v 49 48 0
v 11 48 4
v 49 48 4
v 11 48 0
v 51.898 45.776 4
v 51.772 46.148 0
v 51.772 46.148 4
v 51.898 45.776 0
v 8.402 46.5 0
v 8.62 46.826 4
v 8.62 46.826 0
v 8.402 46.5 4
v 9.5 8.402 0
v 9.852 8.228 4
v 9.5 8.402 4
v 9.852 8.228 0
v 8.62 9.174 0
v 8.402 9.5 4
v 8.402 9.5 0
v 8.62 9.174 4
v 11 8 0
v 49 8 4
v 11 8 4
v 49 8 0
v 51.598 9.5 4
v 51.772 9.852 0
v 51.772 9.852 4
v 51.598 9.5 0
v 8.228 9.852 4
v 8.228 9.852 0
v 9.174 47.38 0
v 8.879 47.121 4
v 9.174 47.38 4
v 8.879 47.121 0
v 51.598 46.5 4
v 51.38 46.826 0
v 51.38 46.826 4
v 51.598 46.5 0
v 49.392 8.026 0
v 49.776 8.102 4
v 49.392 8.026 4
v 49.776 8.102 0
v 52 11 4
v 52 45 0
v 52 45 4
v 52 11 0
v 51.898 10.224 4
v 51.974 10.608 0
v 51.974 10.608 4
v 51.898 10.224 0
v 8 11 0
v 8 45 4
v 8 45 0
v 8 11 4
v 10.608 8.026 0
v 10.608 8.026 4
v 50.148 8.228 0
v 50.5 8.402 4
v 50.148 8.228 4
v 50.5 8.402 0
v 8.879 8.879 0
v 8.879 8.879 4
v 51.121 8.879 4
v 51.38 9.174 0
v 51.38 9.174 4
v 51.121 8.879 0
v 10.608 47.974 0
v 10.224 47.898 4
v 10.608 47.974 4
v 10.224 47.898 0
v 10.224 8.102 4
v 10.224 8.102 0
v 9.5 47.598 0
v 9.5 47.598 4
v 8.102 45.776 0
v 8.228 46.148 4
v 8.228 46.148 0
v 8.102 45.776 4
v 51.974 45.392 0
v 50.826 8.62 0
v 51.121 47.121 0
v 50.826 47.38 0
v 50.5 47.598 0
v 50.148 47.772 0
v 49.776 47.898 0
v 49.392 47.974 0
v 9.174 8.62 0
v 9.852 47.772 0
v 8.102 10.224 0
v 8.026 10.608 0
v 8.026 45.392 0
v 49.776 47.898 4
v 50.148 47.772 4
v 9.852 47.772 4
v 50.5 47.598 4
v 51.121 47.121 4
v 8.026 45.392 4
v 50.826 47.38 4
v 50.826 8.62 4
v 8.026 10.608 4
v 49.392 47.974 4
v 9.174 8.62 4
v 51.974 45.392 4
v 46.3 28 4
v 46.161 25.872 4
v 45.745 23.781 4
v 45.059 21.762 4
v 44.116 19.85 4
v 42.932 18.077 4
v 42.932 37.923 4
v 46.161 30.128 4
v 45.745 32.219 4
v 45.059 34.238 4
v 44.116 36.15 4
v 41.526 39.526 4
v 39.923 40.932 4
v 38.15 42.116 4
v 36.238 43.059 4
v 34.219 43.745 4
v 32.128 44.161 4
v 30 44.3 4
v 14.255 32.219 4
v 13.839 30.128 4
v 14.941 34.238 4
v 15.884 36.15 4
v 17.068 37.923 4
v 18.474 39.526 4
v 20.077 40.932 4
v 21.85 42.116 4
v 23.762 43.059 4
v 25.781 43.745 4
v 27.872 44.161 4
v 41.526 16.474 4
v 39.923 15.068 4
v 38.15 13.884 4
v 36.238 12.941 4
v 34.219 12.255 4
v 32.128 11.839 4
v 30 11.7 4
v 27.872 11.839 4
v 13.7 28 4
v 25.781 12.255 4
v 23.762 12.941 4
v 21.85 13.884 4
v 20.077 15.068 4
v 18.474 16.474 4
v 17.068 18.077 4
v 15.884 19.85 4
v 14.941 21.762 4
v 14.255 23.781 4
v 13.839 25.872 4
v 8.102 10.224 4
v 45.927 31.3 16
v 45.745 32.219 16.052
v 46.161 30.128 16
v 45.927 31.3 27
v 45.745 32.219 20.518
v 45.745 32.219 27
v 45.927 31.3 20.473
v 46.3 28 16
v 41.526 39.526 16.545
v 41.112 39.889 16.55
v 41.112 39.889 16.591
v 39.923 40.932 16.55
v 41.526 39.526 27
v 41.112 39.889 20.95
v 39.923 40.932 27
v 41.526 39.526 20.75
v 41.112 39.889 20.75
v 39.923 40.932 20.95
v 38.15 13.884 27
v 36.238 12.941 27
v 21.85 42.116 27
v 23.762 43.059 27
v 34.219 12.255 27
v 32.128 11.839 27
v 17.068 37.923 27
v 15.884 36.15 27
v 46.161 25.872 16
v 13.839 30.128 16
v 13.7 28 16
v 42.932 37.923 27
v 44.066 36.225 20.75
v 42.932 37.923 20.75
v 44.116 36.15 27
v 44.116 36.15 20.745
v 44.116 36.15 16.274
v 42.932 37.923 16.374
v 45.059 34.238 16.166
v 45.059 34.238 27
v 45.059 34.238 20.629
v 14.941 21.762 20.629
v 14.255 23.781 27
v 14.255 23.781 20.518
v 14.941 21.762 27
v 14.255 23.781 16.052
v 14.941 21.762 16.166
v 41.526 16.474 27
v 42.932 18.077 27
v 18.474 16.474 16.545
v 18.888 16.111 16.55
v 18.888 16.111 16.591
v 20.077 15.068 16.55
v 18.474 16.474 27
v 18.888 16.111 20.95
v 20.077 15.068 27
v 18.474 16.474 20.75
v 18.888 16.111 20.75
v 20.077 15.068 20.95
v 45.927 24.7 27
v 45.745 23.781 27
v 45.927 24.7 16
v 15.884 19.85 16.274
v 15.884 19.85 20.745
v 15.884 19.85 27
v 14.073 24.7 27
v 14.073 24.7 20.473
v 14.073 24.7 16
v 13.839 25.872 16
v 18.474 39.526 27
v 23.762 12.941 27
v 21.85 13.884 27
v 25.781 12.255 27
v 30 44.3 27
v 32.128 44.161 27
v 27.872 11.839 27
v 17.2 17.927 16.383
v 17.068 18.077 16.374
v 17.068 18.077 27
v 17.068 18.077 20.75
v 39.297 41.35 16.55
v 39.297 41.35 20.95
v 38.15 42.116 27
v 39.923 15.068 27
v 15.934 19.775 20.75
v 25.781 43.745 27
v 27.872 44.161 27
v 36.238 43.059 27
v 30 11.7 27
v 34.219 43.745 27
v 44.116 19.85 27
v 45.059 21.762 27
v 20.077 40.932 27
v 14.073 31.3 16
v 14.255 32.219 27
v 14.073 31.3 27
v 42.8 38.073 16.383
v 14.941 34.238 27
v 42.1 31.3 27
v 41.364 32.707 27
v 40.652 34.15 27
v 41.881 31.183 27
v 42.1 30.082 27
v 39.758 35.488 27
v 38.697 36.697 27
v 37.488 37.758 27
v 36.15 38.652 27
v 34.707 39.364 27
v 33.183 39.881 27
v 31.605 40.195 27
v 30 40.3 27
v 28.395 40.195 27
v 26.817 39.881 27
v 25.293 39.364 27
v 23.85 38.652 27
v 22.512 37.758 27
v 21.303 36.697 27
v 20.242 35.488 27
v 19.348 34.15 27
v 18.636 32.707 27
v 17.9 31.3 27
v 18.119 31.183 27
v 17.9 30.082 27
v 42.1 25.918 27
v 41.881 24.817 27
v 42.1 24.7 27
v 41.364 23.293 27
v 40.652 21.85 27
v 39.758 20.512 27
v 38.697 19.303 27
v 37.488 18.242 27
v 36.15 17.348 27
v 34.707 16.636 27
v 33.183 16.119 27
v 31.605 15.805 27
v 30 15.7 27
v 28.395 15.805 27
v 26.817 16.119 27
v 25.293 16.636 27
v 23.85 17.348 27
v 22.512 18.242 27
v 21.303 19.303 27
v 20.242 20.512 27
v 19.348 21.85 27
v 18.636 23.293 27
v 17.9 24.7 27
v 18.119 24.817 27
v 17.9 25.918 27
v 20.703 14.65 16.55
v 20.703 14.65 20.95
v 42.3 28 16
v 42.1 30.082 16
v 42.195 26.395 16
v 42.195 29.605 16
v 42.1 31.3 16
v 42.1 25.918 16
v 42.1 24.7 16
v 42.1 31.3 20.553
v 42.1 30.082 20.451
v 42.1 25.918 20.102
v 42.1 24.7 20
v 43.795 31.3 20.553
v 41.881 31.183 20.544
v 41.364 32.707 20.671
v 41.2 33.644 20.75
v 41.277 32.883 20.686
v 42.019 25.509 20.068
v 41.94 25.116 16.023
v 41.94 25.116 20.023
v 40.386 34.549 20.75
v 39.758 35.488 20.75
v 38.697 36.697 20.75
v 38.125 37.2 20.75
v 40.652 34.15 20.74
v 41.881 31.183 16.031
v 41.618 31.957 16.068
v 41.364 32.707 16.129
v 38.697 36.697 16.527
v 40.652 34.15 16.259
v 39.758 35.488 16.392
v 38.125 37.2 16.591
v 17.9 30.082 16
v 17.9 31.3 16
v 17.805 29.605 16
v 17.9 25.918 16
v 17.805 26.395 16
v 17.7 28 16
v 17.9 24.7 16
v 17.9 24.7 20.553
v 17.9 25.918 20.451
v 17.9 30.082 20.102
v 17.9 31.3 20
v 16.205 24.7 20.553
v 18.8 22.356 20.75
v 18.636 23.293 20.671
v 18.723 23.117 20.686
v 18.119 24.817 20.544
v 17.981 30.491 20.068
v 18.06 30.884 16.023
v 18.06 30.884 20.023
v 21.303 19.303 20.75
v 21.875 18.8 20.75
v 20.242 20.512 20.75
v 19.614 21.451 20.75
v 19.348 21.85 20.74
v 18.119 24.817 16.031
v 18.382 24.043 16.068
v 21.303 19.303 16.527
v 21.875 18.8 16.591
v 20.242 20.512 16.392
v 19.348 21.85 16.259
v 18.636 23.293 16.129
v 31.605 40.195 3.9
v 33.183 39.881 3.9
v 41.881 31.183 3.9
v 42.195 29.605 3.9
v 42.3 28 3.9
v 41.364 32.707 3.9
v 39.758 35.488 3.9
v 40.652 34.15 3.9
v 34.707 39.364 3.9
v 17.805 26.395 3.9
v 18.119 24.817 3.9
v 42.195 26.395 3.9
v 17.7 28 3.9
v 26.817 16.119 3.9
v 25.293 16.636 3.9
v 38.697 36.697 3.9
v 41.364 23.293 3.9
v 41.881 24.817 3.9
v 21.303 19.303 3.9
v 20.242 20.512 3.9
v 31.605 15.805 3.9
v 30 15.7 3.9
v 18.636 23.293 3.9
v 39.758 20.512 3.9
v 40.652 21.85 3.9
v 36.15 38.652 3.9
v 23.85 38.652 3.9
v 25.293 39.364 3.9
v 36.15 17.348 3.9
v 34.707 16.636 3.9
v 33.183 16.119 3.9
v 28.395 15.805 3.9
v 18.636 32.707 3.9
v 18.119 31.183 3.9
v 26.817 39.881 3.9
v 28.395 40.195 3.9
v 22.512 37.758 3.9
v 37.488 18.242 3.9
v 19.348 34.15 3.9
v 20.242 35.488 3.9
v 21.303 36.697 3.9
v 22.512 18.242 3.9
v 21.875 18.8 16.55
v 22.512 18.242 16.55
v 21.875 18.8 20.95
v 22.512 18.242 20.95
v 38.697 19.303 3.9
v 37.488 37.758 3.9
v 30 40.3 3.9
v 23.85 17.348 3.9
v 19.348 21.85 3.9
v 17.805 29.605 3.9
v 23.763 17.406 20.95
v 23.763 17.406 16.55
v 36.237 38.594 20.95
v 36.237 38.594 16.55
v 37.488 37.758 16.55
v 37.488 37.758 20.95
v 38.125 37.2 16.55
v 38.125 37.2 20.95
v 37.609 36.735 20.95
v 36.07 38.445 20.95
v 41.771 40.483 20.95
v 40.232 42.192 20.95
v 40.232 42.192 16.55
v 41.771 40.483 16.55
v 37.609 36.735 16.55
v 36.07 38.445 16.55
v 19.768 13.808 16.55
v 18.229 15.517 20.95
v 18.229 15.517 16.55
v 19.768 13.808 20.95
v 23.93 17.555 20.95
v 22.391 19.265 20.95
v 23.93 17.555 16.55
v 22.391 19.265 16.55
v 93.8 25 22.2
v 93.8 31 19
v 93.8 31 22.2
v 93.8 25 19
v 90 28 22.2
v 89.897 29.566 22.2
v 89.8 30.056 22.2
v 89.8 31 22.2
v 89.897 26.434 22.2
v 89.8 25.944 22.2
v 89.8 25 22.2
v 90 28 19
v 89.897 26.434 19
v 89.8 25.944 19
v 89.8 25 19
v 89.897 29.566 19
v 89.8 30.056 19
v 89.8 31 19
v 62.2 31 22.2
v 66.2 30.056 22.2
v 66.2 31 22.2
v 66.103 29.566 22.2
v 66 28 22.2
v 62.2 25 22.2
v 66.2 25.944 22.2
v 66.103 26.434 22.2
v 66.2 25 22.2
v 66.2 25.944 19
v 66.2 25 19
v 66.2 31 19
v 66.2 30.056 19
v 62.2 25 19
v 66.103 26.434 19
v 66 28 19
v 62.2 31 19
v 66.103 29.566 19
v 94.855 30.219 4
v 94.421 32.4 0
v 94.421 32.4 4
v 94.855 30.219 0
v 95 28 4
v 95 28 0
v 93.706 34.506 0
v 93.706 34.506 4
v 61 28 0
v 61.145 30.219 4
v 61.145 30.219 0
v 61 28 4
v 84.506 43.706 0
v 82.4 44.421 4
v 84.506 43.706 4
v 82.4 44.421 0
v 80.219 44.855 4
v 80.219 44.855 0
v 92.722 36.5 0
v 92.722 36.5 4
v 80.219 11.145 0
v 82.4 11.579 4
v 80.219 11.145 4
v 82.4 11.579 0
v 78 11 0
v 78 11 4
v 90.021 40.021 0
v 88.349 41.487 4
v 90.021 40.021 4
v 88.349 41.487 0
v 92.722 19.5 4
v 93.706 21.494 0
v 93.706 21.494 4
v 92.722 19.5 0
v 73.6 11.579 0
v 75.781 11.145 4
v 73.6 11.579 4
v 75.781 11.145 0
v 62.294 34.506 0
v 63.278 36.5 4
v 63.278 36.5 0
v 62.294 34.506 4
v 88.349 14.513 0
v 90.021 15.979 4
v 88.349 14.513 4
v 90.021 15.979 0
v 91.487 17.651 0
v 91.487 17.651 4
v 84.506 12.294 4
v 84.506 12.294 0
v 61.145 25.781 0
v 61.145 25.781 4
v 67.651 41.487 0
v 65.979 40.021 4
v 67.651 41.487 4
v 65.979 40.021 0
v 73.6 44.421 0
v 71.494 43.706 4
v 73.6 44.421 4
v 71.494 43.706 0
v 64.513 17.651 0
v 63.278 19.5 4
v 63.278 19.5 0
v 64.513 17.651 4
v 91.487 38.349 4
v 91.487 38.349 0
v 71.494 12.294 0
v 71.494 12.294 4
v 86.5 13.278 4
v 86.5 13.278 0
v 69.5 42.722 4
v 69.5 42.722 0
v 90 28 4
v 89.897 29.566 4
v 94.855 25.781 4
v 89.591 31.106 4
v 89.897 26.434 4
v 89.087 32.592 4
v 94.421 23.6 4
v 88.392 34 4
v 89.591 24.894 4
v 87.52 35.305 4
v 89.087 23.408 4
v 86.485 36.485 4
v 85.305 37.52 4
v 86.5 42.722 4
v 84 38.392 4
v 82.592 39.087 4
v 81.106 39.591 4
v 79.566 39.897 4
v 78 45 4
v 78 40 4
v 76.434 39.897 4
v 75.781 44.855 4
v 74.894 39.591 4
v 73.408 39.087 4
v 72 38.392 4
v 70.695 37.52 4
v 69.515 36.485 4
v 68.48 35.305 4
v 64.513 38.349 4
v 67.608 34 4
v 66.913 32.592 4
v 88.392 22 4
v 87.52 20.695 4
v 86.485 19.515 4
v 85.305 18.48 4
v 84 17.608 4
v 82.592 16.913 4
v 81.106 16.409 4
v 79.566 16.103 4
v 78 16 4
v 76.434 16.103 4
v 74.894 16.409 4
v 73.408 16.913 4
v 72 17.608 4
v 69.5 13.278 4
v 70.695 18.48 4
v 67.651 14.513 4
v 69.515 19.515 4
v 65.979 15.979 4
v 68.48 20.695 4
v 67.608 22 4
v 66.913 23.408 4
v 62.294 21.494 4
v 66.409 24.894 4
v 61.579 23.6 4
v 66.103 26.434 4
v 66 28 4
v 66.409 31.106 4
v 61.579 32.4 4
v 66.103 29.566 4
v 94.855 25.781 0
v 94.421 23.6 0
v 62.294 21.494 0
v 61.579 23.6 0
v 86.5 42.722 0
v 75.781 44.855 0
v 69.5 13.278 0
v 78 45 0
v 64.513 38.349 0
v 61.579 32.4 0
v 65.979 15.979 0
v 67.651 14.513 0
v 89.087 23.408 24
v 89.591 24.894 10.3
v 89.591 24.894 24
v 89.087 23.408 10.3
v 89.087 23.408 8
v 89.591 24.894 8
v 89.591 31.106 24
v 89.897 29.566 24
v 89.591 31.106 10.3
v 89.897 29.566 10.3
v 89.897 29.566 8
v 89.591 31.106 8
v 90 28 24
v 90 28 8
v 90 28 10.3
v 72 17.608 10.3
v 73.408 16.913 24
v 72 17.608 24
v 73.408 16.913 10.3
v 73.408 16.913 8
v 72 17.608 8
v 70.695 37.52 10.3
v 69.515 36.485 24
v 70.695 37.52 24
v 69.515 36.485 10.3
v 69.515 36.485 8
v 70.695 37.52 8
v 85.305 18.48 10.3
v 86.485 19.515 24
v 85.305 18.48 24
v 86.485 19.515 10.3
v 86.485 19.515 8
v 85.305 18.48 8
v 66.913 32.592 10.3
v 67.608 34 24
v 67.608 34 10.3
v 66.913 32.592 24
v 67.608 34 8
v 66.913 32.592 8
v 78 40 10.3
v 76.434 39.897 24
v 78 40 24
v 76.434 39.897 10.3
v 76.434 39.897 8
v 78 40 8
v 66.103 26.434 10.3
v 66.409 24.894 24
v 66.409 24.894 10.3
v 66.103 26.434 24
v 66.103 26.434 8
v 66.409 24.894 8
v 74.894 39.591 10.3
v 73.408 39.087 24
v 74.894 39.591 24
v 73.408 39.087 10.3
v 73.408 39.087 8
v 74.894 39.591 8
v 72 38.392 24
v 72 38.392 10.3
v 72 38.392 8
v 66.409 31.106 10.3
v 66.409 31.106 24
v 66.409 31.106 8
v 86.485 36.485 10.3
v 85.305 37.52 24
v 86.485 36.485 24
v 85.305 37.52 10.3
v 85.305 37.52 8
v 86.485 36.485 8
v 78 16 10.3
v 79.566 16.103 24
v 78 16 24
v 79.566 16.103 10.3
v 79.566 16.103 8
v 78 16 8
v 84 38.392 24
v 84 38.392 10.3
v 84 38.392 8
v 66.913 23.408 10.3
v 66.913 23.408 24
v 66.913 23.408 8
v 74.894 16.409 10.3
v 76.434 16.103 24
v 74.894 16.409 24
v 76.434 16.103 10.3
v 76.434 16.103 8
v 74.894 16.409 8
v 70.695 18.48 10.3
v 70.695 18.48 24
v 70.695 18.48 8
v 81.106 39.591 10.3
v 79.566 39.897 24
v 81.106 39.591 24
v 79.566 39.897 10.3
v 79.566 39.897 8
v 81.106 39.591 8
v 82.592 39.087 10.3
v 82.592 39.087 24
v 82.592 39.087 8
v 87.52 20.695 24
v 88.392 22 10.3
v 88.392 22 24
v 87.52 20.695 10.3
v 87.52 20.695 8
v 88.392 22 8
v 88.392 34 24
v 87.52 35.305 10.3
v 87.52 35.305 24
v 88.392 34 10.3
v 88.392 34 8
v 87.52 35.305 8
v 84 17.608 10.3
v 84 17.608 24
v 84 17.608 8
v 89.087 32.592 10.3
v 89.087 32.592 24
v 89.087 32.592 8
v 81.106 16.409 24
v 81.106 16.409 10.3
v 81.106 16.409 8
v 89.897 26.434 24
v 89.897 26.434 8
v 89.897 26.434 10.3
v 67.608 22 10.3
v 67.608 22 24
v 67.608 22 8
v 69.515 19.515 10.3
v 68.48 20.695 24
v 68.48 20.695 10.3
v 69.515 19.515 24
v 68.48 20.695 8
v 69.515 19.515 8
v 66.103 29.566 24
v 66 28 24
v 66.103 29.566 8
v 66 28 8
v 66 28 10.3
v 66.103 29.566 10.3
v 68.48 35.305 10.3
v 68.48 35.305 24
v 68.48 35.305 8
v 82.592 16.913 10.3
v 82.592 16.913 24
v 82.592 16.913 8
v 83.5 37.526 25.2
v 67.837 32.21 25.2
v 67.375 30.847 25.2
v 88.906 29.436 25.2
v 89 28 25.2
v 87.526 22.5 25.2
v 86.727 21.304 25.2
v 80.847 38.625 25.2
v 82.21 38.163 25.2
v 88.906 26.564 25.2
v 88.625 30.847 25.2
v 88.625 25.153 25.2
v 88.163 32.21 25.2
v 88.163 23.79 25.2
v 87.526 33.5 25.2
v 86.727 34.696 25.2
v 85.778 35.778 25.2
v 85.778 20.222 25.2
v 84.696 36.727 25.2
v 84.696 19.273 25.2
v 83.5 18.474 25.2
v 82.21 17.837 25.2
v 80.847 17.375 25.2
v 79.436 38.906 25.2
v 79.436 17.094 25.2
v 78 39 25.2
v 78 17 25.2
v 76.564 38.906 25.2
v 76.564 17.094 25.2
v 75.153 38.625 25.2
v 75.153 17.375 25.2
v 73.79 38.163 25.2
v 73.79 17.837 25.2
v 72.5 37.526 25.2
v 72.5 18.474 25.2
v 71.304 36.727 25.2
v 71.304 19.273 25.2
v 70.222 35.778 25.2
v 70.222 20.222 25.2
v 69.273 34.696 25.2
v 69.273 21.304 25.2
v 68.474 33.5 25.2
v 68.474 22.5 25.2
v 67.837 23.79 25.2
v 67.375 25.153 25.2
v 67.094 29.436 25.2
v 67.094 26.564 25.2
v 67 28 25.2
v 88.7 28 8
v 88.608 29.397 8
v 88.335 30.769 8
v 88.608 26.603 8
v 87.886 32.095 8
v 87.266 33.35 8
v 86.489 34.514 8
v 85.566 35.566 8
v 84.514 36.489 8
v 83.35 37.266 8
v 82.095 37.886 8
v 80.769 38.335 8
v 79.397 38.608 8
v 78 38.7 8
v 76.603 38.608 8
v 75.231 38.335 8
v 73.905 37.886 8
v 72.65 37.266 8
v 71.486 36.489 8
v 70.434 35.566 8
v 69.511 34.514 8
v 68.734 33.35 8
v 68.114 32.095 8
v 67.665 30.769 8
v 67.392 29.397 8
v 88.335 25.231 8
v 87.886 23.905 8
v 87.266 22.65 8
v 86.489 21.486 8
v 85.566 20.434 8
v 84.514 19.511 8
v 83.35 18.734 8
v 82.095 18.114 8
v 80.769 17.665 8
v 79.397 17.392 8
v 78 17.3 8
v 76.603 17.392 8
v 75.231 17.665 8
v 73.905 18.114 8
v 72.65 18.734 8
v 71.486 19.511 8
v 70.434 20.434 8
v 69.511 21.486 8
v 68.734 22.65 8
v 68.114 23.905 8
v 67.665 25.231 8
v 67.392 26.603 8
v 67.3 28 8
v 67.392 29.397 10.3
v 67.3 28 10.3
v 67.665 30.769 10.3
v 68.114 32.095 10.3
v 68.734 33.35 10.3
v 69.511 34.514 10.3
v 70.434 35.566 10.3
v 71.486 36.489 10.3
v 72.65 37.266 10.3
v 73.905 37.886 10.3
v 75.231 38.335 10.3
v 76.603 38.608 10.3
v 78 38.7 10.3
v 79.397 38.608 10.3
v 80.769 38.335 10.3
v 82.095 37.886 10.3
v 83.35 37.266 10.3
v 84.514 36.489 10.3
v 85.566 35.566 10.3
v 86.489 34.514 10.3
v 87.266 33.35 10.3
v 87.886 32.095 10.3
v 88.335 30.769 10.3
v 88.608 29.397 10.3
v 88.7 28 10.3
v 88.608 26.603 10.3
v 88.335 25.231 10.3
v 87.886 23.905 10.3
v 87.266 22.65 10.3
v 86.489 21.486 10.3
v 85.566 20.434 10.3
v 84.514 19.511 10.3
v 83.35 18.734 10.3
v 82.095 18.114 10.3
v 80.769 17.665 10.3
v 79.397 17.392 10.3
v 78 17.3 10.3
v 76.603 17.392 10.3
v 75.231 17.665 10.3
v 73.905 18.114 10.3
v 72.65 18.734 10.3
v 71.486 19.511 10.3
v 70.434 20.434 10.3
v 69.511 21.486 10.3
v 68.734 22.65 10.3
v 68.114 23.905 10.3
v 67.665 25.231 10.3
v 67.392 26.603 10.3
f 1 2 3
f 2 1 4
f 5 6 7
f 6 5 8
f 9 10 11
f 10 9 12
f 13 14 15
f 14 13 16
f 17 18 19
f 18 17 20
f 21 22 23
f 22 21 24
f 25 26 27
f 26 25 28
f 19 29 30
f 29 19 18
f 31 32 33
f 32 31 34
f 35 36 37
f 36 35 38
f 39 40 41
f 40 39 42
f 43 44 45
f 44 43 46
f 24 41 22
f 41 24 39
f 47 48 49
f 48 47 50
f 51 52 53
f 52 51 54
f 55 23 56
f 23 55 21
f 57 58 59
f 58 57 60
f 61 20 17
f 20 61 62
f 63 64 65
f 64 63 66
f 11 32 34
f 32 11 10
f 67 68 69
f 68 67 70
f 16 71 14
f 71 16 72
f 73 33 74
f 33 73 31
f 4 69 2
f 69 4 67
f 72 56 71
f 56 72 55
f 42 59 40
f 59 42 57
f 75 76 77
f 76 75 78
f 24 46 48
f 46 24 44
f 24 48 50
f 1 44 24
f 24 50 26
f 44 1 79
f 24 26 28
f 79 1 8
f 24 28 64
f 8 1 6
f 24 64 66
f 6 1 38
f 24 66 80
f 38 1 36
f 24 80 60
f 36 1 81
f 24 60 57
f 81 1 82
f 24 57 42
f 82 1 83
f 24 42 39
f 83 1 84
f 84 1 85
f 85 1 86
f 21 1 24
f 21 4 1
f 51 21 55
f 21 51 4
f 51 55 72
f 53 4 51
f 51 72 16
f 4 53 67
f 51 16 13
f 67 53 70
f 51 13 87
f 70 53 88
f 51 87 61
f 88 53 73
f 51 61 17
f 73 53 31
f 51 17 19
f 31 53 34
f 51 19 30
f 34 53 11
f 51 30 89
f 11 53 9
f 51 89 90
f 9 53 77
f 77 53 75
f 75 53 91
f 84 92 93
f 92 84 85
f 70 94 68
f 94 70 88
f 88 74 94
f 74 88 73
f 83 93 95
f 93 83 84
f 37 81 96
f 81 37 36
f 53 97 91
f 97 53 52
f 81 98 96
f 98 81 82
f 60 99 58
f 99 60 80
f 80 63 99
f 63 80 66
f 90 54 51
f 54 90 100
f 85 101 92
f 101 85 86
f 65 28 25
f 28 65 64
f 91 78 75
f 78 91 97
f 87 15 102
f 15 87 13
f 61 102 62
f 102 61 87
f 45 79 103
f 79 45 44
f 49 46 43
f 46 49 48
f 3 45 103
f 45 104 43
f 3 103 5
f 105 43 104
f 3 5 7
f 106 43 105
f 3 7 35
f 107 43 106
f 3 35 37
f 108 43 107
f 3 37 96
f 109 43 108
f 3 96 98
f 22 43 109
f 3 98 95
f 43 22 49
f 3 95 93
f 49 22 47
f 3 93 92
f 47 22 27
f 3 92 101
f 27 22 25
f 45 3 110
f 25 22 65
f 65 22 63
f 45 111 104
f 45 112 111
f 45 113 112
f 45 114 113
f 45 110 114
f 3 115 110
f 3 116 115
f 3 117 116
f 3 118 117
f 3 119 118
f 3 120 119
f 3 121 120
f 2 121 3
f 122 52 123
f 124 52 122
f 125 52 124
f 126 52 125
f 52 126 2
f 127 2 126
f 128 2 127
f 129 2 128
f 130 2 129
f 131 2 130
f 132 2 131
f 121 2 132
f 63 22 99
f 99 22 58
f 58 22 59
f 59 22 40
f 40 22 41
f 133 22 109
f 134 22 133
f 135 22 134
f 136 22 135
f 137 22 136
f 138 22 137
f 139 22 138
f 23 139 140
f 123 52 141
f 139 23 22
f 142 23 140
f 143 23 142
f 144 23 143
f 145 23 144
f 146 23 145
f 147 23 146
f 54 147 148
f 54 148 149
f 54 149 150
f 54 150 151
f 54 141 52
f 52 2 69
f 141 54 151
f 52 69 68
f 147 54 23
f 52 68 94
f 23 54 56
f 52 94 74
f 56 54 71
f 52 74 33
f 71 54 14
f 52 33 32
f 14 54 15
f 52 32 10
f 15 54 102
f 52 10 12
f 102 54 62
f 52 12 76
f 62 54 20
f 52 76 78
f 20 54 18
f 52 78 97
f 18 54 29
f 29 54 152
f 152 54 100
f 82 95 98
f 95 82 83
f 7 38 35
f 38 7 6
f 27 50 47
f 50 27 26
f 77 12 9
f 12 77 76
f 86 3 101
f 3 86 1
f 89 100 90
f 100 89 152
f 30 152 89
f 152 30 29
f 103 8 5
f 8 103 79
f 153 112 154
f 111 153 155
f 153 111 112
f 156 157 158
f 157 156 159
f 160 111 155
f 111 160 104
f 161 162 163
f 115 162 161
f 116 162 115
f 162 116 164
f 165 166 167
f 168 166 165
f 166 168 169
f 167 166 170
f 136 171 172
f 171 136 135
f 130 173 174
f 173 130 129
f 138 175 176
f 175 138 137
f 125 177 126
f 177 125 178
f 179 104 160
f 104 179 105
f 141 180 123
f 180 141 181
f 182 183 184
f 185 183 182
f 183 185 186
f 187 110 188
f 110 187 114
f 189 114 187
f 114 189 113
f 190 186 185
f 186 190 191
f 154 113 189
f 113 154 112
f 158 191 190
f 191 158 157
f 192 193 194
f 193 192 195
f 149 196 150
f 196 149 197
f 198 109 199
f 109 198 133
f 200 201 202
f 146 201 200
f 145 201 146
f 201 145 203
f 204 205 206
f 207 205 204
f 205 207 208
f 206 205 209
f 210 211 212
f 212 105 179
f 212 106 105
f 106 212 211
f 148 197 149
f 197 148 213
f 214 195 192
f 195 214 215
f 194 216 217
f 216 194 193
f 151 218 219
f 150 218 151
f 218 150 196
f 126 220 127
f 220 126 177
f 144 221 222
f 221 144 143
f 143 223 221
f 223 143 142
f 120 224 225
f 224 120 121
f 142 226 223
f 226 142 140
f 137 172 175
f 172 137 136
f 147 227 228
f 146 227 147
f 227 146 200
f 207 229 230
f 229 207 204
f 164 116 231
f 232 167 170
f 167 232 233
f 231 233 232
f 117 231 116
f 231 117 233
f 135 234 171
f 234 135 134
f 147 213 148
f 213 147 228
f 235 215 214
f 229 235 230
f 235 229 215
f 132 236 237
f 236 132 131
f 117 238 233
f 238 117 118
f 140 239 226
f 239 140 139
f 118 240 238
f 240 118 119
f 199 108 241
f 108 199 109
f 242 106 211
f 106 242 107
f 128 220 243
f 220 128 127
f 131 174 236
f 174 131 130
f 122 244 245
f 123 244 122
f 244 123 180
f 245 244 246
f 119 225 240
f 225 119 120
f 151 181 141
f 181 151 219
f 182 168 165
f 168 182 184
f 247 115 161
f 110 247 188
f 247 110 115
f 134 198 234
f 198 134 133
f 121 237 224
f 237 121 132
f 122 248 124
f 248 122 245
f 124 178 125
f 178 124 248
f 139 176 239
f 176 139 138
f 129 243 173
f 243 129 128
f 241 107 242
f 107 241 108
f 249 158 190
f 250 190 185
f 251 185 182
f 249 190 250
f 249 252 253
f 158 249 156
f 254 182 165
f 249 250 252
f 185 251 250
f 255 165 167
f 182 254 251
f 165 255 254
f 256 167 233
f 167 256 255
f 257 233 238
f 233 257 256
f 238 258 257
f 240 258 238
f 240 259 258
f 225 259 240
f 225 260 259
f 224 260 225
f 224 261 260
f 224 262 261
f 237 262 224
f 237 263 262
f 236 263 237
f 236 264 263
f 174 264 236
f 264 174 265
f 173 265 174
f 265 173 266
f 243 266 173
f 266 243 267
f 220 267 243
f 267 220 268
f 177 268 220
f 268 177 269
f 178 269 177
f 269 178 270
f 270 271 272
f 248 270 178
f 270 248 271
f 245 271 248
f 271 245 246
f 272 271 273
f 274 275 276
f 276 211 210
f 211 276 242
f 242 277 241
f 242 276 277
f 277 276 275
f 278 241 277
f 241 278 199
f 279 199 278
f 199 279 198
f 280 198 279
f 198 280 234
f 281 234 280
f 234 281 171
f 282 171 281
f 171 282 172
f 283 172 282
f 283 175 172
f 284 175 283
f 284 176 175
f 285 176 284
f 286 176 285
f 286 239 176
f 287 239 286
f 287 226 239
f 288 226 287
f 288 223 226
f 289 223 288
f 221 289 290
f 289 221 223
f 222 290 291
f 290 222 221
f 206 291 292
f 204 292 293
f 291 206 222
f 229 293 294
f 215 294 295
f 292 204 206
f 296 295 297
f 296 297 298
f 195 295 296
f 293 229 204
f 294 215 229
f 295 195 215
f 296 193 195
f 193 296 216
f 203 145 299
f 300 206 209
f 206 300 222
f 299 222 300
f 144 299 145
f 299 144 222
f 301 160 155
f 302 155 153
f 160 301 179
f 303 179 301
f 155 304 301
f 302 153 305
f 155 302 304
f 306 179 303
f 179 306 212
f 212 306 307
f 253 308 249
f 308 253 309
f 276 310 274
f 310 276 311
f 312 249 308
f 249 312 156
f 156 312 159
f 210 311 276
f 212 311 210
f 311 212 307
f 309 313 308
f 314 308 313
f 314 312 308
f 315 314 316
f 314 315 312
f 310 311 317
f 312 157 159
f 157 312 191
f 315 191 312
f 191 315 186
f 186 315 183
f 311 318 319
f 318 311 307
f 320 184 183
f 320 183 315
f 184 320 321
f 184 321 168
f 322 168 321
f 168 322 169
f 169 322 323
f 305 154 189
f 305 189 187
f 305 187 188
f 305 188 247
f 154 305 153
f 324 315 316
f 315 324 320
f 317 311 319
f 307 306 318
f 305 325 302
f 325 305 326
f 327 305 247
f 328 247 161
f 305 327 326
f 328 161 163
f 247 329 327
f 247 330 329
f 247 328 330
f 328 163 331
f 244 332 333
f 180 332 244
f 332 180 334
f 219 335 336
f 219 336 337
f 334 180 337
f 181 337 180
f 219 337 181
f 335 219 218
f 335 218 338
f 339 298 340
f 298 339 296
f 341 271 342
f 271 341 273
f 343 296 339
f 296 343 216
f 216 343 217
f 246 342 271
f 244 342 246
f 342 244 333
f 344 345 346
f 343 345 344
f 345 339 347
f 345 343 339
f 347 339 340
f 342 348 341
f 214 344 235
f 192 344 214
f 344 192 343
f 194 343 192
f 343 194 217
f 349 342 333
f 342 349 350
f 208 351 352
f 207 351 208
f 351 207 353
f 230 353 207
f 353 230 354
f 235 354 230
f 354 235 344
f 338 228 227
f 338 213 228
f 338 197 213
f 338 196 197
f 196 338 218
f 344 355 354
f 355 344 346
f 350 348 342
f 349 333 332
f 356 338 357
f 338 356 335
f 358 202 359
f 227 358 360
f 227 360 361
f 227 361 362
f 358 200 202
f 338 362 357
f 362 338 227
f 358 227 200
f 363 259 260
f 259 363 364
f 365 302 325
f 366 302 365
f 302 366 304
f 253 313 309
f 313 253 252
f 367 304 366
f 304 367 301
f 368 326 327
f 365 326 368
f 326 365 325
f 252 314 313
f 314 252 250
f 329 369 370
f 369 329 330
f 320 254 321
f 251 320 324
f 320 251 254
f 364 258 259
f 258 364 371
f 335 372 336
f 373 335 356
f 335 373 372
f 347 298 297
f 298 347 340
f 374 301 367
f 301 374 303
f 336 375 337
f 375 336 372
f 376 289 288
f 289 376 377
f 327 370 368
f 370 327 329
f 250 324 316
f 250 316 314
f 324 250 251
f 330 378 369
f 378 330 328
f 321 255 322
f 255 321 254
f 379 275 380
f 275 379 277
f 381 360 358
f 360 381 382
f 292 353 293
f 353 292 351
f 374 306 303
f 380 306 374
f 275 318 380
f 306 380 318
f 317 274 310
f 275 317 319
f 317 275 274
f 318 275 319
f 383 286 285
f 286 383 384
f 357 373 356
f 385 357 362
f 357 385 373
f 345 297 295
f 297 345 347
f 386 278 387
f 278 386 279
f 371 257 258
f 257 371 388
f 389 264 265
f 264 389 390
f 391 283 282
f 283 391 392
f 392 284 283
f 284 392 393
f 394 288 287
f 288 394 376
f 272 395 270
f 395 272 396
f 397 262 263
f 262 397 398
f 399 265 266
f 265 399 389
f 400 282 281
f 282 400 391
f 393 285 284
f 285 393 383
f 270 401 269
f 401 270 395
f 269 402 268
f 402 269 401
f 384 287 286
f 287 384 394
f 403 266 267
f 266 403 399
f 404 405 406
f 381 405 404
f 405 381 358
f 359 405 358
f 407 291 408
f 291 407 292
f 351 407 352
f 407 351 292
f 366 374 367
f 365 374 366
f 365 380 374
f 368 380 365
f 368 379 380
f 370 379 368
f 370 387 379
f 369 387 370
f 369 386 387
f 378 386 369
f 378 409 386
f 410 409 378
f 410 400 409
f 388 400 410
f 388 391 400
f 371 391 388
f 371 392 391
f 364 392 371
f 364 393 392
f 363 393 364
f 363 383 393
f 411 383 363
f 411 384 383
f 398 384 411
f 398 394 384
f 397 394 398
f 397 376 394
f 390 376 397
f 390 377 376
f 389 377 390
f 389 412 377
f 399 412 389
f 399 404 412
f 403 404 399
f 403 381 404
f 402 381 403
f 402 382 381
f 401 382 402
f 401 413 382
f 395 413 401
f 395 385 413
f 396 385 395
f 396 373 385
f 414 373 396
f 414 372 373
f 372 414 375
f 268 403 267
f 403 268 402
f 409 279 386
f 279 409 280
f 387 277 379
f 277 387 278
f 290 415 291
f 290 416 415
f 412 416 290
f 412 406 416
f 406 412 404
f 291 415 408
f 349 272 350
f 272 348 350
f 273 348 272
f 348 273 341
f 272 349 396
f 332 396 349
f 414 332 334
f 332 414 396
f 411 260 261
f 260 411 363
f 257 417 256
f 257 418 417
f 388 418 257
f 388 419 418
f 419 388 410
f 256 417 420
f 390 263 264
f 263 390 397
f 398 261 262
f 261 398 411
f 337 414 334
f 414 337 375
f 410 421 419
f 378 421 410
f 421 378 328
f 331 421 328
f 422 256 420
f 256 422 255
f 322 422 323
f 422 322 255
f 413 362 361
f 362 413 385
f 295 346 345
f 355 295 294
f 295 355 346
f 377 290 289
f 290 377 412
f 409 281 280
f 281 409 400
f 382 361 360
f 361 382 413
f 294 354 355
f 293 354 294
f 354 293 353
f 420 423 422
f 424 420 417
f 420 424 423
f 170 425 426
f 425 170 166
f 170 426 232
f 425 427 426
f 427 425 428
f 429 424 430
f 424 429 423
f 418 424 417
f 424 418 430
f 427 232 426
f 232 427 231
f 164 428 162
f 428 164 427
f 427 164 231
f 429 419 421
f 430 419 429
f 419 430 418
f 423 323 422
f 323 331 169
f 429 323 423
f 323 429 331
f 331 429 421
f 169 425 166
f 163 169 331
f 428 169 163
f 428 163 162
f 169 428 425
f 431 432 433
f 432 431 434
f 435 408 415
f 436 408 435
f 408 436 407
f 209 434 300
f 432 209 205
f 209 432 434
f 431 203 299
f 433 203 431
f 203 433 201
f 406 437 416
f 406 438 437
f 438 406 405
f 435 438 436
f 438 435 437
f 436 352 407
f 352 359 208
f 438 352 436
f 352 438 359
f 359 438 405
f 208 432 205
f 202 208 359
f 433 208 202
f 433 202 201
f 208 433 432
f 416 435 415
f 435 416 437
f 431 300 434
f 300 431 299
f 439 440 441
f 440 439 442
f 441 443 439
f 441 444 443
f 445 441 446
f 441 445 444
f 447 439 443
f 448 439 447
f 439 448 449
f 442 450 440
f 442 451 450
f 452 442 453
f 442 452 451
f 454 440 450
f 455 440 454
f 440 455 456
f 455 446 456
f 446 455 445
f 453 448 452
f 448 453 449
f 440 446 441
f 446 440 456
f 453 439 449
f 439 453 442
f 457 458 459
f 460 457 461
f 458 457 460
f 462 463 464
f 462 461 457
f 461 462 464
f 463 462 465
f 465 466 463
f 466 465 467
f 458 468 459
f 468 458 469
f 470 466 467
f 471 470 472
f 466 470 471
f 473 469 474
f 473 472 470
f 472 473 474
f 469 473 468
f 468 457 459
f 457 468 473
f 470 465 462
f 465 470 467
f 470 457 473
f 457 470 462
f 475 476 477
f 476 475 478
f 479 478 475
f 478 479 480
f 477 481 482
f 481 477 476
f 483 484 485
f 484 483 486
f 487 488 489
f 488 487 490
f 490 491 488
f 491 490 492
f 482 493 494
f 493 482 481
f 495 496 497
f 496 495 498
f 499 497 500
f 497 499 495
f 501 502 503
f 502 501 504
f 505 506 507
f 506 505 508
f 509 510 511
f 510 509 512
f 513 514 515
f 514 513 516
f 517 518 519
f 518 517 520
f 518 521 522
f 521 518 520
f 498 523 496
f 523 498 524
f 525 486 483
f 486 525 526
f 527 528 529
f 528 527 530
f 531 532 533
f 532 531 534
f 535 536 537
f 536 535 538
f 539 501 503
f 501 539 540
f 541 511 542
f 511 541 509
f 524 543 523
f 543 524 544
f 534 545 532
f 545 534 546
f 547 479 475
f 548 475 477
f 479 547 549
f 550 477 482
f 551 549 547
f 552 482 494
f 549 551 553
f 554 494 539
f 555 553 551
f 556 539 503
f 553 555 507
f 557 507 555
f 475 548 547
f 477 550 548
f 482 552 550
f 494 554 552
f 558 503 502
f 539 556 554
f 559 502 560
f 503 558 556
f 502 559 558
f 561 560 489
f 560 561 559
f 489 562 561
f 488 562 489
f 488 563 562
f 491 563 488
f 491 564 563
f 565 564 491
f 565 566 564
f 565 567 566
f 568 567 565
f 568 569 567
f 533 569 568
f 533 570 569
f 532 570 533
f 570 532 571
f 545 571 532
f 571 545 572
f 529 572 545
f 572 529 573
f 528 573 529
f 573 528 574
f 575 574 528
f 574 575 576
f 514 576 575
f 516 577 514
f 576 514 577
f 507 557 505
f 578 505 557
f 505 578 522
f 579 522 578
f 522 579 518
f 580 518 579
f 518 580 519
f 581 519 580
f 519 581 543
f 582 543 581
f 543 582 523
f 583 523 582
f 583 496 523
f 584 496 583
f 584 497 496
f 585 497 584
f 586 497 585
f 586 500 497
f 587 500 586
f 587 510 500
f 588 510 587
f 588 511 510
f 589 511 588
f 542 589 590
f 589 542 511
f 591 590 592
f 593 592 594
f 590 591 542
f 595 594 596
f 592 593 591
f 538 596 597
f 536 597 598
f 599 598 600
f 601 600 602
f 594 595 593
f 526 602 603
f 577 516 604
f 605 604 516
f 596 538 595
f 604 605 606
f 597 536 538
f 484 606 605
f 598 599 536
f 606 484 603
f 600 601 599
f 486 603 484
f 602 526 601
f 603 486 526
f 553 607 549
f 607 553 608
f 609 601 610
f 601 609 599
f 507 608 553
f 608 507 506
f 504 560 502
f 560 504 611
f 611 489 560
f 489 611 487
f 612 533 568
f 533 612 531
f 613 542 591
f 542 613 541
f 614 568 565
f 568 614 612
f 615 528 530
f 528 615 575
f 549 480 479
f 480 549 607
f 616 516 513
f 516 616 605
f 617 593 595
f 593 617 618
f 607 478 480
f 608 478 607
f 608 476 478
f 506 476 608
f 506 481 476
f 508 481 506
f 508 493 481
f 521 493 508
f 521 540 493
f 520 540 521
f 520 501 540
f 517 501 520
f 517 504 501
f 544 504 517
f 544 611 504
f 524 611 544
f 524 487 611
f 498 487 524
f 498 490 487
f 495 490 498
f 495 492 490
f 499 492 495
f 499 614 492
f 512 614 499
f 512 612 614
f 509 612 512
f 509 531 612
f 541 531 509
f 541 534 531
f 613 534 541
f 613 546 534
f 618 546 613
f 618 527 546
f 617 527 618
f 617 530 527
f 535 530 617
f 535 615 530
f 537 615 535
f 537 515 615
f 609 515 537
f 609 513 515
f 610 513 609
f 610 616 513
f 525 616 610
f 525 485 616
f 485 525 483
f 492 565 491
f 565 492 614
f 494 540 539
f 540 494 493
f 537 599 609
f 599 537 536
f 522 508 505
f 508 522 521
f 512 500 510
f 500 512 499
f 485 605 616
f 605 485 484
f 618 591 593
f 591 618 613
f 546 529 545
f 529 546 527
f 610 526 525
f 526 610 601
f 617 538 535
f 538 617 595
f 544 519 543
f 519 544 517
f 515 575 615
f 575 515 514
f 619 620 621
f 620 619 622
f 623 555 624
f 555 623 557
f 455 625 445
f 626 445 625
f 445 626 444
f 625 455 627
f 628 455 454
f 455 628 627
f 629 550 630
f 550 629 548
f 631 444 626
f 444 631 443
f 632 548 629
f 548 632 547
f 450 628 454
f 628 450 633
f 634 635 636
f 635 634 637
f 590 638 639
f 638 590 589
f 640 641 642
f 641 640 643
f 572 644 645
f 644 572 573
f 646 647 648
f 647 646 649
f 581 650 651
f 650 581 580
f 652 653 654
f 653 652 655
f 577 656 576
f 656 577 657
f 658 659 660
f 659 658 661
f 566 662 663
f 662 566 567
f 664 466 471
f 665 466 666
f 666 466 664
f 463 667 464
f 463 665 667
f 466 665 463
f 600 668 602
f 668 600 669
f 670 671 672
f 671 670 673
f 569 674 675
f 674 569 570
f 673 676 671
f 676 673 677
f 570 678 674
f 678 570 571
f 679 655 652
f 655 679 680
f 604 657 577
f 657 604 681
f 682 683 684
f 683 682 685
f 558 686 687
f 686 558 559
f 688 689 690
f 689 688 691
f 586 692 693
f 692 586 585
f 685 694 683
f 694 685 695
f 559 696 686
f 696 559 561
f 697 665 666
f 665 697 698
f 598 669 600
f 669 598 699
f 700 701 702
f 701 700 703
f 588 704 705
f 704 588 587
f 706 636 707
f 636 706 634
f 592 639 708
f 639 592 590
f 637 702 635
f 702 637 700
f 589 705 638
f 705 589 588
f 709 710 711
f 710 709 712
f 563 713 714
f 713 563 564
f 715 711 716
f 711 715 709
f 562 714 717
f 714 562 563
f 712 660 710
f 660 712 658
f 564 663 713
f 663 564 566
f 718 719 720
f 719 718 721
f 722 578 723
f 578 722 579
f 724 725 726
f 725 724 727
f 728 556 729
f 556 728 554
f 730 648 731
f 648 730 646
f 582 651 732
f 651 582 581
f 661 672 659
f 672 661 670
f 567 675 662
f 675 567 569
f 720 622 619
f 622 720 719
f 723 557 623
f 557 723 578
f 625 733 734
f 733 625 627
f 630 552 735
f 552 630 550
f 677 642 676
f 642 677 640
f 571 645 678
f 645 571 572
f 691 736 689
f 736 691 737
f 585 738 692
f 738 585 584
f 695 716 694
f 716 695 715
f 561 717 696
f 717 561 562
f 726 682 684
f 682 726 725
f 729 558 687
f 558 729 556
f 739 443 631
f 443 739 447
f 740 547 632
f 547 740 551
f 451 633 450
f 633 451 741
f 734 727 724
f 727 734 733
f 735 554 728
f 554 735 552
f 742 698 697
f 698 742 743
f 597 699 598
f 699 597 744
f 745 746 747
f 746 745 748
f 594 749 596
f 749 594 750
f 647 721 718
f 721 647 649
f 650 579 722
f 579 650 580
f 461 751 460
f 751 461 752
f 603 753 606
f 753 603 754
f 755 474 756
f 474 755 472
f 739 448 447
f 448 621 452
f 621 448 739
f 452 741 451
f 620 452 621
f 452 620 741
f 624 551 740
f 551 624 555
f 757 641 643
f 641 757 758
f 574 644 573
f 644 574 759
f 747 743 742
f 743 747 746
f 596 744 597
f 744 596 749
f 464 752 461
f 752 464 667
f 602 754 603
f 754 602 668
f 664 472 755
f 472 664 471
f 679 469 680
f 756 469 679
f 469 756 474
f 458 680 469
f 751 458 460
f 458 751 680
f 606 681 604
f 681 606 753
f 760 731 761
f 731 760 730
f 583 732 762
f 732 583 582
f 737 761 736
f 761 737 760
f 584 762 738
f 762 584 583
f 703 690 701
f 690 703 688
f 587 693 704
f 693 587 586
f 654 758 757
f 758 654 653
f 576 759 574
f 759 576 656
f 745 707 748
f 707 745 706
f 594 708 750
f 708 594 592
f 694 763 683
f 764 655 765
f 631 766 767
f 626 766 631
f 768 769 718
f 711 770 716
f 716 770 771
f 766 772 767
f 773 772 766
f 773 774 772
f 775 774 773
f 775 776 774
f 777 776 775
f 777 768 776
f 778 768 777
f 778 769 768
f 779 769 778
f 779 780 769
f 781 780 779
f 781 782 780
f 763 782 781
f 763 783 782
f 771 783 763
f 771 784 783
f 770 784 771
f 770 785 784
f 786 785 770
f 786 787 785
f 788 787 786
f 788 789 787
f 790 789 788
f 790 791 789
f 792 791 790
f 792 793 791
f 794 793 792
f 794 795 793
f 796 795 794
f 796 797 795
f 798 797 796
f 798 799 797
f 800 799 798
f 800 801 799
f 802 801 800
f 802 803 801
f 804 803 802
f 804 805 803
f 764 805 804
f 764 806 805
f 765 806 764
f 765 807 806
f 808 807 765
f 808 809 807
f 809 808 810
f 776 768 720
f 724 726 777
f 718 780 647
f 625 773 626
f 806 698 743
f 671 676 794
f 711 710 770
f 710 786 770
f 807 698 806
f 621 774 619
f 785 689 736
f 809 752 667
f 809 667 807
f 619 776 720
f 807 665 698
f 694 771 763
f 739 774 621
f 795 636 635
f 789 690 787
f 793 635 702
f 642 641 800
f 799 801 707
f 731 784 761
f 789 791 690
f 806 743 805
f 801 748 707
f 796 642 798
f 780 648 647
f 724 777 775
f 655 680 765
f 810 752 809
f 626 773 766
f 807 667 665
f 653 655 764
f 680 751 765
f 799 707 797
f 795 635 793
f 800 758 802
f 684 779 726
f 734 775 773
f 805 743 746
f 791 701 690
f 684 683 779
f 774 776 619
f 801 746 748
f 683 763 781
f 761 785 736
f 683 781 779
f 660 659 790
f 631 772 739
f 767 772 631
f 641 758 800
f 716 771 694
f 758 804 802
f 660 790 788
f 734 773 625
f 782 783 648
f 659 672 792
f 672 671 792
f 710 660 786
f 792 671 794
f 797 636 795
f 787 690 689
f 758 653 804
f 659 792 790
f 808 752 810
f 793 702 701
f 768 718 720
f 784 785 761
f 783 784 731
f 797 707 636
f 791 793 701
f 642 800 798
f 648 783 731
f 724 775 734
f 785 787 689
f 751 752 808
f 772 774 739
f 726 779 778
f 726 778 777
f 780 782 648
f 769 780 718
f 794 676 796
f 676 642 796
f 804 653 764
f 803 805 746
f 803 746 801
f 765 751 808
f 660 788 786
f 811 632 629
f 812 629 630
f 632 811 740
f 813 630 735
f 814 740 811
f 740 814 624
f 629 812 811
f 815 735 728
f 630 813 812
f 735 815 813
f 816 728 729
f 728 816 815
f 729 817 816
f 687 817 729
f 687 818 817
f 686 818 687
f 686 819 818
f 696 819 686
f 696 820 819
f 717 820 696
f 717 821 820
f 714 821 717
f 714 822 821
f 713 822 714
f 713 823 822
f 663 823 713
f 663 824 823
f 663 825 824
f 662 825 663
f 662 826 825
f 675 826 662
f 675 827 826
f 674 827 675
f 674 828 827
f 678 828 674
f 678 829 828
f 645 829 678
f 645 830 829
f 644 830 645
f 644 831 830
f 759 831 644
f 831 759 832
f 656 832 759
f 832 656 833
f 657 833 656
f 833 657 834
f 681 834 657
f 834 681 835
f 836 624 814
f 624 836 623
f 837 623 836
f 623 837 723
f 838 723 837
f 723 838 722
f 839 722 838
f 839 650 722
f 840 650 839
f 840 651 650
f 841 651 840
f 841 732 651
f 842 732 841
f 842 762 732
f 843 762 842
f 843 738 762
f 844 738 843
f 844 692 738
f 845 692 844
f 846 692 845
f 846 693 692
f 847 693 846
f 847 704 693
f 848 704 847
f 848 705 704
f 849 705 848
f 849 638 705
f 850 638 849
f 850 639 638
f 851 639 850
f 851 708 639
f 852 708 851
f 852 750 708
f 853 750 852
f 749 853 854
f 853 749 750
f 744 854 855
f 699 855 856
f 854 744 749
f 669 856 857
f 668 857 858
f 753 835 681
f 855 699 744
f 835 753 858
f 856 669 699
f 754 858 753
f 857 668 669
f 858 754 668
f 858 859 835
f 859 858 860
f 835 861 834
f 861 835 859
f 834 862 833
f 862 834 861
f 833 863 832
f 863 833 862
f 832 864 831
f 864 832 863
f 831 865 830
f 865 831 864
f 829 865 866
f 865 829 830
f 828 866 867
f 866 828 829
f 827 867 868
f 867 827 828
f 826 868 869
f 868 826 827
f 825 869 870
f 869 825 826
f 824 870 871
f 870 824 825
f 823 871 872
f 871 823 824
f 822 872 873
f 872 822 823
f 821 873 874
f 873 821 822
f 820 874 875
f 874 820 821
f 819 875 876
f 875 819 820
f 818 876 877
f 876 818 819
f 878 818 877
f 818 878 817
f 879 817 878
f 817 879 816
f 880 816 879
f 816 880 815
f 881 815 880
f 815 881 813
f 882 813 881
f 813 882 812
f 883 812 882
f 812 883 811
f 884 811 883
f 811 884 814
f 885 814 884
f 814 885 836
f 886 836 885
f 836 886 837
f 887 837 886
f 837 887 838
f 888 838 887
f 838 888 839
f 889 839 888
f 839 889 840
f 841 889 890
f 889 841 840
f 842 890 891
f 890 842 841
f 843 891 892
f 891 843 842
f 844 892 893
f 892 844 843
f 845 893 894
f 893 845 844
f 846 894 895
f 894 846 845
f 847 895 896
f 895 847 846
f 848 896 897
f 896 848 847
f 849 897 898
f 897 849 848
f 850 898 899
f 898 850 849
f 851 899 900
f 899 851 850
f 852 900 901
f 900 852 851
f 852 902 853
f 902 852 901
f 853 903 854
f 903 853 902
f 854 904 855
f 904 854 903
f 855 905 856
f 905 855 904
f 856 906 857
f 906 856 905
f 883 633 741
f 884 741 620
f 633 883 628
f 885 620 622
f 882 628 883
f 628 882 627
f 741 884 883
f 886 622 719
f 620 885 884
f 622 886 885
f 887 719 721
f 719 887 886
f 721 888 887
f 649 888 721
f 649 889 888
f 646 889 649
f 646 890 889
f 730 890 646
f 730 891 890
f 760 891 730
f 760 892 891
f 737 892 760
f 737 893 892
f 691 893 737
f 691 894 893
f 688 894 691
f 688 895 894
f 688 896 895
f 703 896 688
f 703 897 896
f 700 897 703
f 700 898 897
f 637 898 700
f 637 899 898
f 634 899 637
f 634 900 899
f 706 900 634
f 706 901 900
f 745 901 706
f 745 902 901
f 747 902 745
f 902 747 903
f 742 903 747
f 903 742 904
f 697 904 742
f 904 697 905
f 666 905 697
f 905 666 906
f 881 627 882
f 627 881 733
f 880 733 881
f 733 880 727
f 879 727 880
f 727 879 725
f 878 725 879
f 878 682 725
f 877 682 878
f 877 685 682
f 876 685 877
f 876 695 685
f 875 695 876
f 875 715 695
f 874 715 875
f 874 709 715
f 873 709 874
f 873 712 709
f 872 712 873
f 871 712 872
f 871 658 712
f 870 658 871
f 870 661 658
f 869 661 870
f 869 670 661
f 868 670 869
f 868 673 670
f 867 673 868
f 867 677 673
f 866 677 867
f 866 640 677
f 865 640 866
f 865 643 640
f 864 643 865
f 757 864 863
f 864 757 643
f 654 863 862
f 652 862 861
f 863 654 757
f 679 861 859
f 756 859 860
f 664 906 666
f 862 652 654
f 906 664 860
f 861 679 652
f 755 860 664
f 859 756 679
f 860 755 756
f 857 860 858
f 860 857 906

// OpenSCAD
/*
Sample 127: O-Ring-vorgespanntes Rampenbajonett — 20 % radiale Kompression
Generated from the FDM Mechanical Sample Library.
Units: millimetres.

Override examples:
  openscad -o custom.stl -D 'view="plate"' -D 'render_fn=64' model.scad
  openscad -o preview.png -D 'view="assembly"' model.scad
*/
use <../../../library/fdm_mechanisms.scad>

render_fn = is_undef(render_fn) ? 48 : render_fn;
view = is_undef(view) ? "plate" : view;
$fn = render_fn;

sample_ramped_bayonet(
    view=view,
    core_d=24,
    running_clearance=0.3,
    lug_w=6,
    ramp_h=0.75,
    turn_deg=42,
    oring_id=21,
    oring_cs=2,
    radial_squeeze=0.2,
    hard_stop=1.5
);
